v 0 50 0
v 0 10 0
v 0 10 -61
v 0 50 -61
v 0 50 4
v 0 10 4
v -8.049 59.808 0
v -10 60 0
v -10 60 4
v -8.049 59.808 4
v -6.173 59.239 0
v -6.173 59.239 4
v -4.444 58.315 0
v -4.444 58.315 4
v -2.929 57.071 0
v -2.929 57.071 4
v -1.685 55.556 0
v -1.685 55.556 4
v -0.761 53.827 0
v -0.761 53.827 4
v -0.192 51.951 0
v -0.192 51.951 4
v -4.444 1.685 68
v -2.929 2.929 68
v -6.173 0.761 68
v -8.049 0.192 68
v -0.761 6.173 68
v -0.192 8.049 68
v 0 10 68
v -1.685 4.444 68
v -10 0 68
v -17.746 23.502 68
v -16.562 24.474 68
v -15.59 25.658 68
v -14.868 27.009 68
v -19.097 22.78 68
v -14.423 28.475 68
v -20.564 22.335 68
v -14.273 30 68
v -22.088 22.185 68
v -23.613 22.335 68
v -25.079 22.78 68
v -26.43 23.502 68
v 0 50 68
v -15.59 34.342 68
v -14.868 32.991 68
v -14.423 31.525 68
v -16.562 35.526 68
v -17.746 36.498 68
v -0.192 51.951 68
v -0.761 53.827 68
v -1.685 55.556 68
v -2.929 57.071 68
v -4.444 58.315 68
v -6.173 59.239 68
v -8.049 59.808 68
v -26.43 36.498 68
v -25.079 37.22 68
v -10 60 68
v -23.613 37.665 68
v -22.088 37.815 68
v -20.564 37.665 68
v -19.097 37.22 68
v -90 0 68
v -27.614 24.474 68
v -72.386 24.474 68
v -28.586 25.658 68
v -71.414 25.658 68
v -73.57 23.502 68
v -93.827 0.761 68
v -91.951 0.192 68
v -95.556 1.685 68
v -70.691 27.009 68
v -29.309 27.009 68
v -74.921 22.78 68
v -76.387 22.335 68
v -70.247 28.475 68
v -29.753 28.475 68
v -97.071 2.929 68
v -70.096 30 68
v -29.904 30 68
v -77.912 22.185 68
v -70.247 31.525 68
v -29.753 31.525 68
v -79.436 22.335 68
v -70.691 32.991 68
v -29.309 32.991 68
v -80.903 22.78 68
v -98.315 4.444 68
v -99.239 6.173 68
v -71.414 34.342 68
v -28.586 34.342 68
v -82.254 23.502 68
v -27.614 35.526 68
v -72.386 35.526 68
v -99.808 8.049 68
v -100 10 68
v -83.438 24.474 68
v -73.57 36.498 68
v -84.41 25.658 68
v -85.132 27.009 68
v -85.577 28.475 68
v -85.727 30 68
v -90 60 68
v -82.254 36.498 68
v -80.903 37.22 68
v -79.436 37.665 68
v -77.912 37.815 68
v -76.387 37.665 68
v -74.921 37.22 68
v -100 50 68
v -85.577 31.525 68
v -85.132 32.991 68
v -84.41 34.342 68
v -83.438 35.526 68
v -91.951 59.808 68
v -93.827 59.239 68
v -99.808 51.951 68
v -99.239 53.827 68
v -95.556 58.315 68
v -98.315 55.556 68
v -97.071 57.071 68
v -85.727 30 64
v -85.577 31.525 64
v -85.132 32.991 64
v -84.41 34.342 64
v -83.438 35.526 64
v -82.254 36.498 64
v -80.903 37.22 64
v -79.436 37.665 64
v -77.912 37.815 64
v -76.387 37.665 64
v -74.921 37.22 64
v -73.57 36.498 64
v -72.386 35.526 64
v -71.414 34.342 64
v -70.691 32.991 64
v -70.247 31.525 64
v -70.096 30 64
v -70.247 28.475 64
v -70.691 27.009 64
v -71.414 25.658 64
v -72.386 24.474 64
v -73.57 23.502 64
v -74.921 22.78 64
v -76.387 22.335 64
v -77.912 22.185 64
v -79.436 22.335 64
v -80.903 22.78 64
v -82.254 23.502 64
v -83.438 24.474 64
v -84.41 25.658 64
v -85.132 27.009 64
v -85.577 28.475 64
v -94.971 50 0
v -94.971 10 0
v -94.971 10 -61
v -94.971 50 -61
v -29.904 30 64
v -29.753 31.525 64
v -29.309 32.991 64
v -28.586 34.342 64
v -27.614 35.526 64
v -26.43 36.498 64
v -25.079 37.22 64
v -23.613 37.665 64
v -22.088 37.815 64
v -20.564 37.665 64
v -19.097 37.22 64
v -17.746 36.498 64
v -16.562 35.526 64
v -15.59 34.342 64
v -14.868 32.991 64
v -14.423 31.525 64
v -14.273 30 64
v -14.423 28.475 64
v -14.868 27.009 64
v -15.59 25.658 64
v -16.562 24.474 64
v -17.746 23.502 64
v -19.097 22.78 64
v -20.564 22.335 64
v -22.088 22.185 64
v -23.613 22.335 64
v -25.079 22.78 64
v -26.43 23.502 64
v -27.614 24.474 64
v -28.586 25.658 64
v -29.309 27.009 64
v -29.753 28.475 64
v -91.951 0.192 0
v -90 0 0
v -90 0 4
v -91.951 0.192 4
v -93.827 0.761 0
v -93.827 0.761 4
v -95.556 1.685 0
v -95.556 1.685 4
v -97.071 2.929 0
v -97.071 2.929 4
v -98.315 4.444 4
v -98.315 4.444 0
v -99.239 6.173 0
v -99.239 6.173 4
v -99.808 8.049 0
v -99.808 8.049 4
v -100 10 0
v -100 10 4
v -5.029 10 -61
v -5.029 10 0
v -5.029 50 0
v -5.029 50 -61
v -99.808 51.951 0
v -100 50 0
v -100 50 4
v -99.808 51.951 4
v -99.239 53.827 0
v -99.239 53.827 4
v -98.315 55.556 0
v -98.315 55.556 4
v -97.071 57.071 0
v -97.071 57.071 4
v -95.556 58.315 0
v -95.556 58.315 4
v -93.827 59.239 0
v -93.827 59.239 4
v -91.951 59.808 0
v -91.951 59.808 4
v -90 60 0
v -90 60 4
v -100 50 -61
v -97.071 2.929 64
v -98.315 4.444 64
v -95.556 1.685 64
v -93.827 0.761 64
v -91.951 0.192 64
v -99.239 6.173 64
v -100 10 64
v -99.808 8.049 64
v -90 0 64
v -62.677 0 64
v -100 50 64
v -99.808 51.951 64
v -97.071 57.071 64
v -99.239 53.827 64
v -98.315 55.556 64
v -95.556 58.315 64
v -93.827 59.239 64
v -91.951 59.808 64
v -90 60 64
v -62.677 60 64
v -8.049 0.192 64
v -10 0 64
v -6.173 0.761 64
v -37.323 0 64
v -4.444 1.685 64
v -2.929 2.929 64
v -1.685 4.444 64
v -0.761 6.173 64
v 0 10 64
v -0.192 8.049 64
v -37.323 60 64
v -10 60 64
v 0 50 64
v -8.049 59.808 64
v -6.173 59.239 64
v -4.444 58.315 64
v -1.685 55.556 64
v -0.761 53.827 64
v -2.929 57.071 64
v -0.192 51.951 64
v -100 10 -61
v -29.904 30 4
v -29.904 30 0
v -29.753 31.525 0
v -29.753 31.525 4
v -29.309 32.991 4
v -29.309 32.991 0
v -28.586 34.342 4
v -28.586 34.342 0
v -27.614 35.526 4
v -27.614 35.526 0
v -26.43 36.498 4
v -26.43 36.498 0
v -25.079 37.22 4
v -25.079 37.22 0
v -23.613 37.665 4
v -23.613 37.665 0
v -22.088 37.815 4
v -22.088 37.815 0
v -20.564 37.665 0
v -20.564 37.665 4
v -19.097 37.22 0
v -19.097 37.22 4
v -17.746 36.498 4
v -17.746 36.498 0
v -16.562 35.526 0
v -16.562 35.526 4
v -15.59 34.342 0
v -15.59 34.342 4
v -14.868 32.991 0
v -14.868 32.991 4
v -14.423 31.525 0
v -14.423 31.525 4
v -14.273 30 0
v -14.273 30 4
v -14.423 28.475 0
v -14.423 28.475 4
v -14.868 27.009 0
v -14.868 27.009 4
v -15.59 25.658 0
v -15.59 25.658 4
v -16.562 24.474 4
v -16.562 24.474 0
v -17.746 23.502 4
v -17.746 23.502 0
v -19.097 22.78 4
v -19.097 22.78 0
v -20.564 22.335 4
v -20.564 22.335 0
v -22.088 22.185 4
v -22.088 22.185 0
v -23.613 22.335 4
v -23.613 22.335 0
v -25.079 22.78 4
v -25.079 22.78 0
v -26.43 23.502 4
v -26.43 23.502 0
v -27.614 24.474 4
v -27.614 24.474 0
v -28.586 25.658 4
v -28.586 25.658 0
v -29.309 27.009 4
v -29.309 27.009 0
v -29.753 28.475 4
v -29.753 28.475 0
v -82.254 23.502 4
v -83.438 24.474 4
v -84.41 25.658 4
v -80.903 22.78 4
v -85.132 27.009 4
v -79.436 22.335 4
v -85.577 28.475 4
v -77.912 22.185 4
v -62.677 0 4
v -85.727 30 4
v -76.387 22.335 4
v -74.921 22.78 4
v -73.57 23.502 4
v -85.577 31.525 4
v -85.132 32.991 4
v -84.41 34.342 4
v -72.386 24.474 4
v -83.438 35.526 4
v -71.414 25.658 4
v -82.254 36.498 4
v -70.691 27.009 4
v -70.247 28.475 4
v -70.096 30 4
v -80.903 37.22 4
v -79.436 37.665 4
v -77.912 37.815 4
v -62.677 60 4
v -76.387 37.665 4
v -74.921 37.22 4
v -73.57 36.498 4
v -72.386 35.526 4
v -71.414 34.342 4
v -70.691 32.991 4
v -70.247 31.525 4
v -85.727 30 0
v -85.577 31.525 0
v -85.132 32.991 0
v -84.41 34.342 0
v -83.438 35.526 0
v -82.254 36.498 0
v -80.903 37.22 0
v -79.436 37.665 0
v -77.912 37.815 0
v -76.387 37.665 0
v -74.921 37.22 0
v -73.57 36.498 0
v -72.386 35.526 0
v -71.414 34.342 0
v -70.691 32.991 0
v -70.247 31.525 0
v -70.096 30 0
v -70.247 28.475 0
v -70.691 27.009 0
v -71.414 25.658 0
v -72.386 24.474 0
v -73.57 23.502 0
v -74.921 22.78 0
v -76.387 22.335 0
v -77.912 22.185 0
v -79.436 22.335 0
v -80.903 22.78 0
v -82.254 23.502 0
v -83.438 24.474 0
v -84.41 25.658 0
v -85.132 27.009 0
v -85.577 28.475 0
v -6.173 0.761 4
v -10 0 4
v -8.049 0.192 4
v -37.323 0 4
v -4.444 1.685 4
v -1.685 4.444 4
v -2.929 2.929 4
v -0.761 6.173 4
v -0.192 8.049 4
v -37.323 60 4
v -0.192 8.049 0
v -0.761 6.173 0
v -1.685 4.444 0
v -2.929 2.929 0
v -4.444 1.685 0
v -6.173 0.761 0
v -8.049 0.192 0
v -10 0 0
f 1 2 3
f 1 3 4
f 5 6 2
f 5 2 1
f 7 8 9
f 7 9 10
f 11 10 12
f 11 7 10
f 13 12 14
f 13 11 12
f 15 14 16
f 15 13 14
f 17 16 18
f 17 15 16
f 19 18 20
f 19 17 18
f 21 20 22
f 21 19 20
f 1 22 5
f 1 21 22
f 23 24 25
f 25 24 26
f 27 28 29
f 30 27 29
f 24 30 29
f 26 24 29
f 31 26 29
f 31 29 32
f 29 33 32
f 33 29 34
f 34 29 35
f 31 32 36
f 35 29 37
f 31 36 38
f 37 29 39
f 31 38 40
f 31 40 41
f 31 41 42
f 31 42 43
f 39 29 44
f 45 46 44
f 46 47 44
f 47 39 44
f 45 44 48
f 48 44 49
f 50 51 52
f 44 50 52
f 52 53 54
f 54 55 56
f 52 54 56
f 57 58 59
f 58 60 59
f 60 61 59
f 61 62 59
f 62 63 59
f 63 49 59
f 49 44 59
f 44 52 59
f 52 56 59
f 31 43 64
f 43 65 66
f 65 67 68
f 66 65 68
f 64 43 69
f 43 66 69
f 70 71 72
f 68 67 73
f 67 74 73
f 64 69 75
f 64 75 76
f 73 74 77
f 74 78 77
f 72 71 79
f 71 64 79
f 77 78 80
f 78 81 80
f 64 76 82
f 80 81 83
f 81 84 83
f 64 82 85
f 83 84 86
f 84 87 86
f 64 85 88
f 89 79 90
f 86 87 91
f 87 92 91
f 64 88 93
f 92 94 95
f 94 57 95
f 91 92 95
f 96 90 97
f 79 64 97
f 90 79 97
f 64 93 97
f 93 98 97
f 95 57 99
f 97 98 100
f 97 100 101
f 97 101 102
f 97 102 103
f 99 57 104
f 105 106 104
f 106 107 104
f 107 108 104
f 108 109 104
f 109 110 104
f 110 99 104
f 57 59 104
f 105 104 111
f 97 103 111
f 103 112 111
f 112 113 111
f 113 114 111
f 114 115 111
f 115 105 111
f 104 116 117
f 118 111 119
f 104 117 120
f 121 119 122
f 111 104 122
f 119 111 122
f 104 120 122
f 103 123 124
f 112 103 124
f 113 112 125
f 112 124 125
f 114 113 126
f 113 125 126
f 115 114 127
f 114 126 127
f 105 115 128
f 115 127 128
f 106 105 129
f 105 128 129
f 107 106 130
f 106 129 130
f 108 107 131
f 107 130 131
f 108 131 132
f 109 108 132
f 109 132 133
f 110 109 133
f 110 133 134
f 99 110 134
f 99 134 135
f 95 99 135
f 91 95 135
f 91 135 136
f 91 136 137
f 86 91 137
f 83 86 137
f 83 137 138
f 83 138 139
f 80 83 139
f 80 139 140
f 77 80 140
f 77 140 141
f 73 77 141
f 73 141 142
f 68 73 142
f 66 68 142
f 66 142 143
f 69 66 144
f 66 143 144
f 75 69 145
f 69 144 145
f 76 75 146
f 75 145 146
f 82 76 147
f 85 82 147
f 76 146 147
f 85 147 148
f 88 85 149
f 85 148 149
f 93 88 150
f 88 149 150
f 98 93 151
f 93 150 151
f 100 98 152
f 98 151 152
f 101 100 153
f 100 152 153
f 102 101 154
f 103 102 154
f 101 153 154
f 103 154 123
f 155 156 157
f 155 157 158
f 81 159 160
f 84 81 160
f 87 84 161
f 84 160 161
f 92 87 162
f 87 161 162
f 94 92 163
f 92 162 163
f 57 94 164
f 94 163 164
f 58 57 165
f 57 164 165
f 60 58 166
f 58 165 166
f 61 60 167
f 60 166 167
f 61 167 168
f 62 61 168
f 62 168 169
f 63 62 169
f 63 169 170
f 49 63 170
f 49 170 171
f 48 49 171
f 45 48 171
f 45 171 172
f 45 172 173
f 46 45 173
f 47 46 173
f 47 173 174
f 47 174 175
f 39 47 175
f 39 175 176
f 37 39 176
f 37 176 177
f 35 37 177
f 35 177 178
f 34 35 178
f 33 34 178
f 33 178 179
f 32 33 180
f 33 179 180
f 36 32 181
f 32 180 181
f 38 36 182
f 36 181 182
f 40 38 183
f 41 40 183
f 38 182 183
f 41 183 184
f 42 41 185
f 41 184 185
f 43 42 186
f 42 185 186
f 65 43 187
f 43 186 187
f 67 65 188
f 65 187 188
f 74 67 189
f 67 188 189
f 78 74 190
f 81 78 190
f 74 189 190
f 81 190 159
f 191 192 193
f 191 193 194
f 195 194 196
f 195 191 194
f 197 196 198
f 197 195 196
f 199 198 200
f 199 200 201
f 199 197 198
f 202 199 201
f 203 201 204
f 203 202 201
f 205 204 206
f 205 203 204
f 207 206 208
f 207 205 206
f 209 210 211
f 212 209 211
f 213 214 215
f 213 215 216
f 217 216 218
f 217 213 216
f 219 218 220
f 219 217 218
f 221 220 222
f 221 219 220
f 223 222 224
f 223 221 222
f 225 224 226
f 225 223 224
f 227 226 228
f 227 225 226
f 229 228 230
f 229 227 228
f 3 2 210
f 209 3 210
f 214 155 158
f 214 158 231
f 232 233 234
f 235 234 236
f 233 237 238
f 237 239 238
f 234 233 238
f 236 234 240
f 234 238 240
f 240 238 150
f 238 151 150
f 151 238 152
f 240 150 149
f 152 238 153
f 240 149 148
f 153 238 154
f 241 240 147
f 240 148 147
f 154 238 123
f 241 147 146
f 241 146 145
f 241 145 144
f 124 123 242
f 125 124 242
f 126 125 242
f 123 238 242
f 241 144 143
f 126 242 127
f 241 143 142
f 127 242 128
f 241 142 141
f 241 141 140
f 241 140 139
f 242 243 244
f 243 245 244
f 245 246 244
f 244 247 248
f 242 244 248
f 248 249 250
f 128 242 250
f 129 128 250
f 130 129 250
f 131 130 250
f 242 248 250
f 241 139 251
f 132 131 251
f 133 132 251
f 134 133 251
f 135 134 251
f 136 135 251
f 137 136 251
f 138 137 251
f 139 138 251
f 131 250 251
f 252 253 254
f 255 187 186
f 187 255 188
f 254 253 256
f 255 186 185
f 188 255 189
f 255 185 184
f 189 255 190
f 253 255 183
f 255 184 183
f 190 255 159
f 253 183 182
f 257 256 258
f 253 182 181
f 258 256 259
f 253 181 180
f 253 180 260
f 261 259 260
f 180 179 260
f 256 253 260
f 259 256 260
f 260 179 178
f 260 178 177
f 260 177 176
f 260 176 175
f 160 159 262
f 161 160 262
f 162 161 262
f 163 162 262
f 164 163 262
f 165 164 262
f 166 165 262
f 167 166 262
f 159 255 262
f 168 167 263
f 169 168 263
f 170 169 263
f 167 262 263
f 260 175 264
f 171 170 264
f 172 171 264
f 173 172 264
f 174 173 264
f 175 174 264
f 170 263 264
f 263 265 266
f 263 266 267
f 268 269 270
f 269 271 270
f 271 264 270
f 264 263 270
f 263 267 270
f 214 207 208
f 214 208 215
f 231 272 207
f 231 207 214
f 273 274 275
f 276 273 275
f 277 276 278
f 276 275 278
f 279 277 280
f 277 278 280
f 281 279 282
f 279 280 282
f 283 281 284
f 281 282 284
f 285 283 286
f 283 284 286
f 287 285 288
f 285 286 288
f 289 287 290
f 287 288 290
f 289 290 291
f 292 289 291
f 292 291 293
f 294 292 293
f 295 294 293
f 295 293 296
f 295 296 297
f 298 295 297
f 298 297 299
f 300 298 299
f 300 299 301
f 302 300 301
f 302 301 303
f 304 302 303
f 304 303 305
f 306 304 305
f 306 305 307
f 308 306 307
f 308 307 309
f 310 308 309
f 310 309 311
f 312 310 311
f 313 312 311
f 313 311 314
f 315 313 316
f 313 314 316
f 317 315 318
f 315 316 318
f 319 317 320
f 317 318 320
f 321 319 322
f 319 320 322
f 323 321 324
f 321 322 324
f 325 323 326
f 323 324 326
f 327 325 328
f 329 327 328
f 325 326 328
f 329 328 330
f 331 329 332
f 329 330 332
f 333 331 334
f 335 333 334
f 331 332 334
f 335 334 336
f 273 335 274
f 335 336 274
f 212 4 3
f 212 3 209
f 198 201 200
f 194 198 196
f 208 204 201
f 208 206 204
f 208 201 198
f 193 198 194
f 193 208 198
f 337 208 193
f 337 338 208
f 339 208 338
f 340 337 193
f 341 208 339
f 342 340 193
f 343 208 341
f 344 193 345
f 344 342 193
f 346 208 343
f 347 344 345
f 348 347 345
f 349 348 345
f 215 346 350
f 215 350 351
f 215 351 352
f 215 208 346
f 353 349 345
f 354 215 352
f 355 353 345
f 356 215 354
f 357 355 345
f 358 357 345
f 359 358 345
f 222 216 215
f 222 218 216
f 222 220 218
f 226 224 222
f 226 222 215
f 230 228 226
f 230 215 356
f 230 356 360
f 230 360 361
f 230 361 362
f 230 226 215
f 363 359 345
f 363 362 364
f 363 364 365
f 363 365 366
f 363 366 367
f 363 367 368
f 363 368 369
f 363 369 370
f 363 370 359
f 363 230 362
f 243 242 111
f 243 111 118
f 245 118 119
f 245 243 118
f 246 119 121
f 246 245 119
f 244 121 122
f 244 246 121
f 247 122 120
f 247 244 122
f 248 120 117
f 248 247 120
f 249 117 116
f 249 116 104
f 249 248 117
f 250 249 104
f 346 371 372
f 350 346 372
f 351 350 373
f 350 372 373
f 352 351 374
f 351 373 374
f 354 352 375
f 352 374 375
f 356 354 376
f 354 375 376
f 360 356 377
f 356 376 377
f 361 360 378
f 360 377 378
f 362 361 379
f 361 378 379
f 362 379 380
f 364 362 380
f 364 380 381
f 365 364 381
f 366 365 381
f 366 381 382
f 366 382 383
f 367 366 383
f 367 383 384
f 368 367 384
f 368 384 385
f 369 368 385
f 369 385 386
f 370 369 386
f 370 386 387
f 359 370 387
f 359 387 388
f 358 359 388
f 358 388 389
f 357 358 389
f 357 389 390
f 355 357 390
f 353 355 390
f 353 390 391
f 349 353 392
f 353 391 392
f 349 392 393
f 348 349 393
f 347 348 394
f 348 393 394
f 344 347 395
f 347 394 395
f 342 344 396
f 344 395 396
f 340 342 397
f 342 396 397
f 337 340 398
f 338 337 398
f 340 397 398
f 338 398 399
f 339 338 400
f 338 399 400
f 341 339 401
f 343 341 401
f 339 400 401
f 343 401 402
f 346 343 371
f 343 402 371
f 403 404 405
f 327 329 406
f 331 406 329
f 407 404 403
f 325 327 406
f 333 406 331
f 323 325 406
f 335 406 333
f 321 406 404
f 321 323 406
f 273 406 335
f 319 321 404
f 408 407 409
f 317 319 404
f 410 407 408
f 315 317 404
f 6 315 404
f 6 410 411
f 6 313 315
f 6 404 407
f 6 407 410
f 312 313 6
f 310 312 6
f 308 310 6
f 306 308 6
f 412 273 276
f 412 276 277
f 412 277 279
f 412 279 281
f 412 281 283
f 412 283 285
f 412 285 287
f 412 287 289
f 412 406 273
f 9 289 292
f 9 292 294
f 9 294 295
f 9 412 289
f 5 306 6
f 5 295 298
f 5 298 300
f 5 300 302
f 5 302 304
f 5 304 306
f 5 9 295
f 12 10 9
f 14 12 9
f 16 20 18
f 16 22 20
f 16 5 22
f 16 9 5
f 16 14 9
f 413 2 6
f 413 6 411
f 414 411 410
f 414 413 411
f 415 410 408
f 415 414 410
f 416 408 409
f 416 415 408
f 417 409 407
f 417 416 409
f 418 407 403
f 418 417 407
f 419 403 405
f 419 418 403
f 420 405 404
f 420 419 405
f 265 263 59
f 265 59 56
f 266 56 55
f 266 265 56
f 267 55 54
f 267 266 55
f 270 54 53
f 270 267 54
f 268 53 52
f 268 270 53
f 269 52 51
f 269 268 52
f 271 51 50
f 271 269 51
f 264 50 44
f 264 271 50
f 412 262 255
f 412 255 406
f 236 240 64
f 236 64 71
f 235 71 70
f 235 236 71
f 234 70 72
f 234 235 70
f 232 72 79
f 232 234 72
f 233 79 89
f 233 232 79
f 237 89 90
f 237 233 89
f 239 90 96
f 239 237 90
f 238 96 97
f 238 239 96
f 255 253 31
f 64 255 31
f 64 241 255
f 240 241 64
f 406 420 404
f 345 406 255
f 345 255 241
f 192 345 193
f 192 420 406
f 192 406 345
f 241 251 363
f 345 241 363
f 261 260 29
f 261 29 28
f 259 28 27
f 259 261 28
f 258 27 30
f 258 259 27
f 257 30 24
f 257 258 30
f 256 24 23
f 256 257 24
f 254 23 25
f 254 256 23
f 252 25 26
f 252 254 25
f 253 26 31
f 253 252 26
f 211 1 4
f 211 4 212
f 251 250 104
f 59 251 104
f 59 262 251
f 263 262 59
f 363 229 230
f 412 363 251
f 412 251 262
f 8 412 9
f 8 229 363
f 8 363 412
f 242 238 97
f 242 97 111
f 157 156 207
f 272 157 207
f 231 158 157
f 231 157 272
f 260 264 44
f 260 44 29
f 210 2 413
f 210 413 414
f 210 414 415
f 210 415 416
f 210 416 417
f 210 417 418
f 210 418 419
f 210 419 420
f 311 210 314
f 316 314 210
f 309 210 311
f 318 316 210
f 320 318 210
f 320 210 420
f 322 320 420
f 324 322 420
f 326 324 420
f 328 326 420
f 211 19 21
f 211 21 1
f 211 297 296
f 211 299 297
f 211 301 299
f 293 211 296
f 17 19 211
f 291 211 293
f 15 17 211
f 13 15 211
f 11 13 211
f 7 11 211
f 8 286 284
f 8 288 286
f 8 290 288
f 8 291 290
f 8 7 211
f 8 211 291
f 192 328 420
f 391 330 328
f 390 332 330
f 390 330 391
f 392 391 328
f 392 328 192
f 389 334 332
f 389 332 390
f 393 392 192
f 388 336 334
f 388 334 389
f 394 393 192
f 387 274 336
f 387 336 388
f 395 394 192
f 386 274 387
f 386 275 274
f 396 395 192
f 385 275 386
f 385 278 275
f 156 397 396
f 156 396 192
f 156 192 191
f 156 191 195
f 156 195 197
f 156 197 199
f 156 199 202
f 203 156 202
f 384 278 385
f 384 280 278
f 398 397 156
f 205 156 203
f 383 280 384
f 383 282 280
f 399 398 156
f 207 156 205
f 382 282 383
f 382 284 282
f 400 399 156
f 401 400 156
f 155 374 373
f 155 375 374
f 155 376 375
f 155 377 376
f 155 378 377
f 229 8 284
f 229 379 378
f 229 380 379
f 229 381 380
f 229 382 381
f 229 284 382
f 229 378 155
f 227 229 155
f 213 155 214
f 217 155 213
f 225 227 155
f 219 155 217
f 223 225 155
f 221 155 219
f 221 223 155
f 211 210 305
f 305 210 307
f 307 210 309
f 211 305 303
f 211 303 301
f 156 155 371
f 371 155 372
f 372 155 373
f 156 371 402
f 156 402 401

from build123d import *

# Parameters (mm, degrees)
EXTRUDE_1_DEPTH     = 68
SKETCH_2_W          = 49.215089209
SKETCH_2_H          = 60
CUT_EXTRUDE_1_DEPTH = 60
SKETCH_3_R          = 7.815290935
CUT_EXTRUDE_2_DEPTH = 68
SKETCH_3_4_R        = 7.815290935
CUT_EXTRUDE_3_DEPTH = 68
SKETCH_5_W          = 5.029333187
SKETCH_5_H          = 40
EXTRUDE_2_DEPTH     = 61


with BuildPart() as part:
    # Эскиз1 → Бобышка-Вытянуть1 (new body)
    with BuildSketch(Plane.XY):
        with BuildLine():
            Line((-90, 60), (-10, 60))
            ThreePointArc((-10, 60), (-2.928932188, 57.071067812), (0, 50))
            Line((0, 50), (0, 10))
            ThreePointArc((0, 10), (-2.928932188, 2.928932188), (-10, 0))
            Line((-10, 0), (-90, 0))
            ThreePointArc((-90, 0), (-97.071067812, 2.928932188), (-100, 10))
            Line((-100, 10), (-100, 50))
            ThreePointArc((-100, 50), (-97.071067812, 57.071067812), (-90, 60))
        make_face()
    extrude(amount=EXTRUDE_1_DEPTH)

    # Эскиз2 → Вырез-Вытянуть1 (cut)
    with BuildSketch(Plane(origin=(0, 60, 0), x_dir=(1, 0, 0), z_dir=(0, 1, 0))):
        with Locations((-12.715841509, -34)):
            Rectangle(SKETCH_2_W, SKETCH_2_H)
        with Locations((-87.284158491, -34)):
            Rectangle(SKETCH_2_W, SKETCH_2_H)
    extrude(amount=-CUT_EXTRUDE_1_DEPTH, mode=Mode.SUBTRACT)

    # Эскиз3 → Вырез-Вытянуть2 (cut)
    with BuildSketch(Plane(origin=(0, 0, 0), x_dir=(-1, 0, 0), z_dir=(0, 0, -1))):
        with Locations((22.08824666, 30)):
            Circle(SKETCH_3_R)
    extrude(amount=-CUT_EXTRUDE_2_DEPTH, mode=Mode.SUBTRACT)

    # Эскиз3<4> → Вырез-Вытянуть3 (cut)
    with BuildSketch(Plane(origin=(0, 0, 0), x_dir=(-1, 0, 0), z_dir=(0, 0, -1))):
        with Locations((77.91175334, 30)):
            Circle(SKETCH_3_4_R)
        with Locations((22.08824666, 30)):
            Circle(SKETCH_3_4_R)
    extrude(amount=-CUT_EXTRUDE_3_DEPTH, mode=Mode.SUBTRACT)

    # Эскиз5 → Бобышка-Вытянуть2 (add)
    with BuildSketch(Plane(origin=(0, 0, 0), x_dir=(-1, 0, 0), z_dir=(0, 0, -1))):
        with Locations((2.514666594, 30)):
            Rectangle(SKETCH_5_W, SKETCH_5_H)
        with Locations((97.485333407, 30)):
            Rectangle(SKETCH_5_W, SKETCH_5_H)
    extrude(amount=EXTRUDE_2_DEPTH)


solid = part.part
